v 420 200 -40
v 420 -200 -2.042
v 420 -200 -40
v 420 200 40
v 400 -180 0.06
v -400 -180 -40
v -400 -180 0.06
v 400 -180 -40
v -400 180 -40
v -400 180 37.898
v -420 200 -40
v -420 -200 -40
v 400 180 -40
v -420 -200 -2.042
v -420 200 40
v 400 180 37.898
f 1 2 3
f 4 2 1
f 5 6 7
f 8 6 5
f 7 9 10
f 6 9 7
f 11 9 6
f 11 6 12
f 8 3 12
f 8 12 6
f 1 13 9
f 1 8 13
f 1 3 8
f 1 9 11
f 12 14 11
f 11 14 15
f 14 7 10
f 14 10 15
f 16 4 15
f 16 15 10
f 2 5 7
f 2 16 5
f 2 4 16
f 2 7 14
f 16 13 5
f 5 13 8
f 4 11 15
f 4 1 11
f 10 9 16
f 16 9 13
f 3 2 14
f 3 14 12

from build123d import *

# Parameters (mm, degrees)
F0_W     = 800
F0_H     = 400
F1_DEPTH = 40
F3_DEPTH = 800.001
F5_DEPTH = 20
F8_W     = 800
F8_H     = 360
F9_DEPTH = 100.001


with BuildPart() as f1:
    # F0 (on Top) → F1 (new body, symmetric)
    with BuildSketch(Plane.XY):
        Rectangle(F0_W, F0_H)
    extrude(amount=F1_DEPTH, both=True)

    # F2 (on face) → F3 (cut, through all)
    with BuildSketch(Plane.YZ.offset(400)):
        Polygon((-180, -20), (-180, -20.0497749922), (-179.5264225832, -20), align=None)
        Polygon((-200, -2.0416941063), (200, 40), (-200, 40), align=None)
    extrude(amount=-F3_DEPTH, mode=Mode.SUBTRACT)

    # F4 (on face) → F5 (join)
    with BuildSketch(Plane.YZ.offset(400)):
        Polygon((200, 40), (-200, -2.0416941063), (-200, -40), (200, -40), align=None)
        Polygon((-179.5264225832, -20), (-180, -20.0497749922), (-180, -20), align=None, mode=Mode.SUBTRACT)
        Polygon((-180, -20), (-180, -20.0497749922), (-179.5264225832, -20), align=None)
    extrude(amount=F5_DEPTH)

    # F6: F1 across plane


with BuildPart() as f1_1:
    add(f1.part)
    add(f1.part.mirror(Plane.YZ))

    # F8 (on offset) → F9 (cut, through all)
    with BuildSketch(Plane(origin=(0, 0, -60), x_dir=(1, 0, 0), z_dir=(0, 0, -1))):
        Rectangle(F8_W, F8_H)
    extrude(amount=-F9_DEPTH, mode=Mode.SUBTRACT)


solid = f1_1.part
